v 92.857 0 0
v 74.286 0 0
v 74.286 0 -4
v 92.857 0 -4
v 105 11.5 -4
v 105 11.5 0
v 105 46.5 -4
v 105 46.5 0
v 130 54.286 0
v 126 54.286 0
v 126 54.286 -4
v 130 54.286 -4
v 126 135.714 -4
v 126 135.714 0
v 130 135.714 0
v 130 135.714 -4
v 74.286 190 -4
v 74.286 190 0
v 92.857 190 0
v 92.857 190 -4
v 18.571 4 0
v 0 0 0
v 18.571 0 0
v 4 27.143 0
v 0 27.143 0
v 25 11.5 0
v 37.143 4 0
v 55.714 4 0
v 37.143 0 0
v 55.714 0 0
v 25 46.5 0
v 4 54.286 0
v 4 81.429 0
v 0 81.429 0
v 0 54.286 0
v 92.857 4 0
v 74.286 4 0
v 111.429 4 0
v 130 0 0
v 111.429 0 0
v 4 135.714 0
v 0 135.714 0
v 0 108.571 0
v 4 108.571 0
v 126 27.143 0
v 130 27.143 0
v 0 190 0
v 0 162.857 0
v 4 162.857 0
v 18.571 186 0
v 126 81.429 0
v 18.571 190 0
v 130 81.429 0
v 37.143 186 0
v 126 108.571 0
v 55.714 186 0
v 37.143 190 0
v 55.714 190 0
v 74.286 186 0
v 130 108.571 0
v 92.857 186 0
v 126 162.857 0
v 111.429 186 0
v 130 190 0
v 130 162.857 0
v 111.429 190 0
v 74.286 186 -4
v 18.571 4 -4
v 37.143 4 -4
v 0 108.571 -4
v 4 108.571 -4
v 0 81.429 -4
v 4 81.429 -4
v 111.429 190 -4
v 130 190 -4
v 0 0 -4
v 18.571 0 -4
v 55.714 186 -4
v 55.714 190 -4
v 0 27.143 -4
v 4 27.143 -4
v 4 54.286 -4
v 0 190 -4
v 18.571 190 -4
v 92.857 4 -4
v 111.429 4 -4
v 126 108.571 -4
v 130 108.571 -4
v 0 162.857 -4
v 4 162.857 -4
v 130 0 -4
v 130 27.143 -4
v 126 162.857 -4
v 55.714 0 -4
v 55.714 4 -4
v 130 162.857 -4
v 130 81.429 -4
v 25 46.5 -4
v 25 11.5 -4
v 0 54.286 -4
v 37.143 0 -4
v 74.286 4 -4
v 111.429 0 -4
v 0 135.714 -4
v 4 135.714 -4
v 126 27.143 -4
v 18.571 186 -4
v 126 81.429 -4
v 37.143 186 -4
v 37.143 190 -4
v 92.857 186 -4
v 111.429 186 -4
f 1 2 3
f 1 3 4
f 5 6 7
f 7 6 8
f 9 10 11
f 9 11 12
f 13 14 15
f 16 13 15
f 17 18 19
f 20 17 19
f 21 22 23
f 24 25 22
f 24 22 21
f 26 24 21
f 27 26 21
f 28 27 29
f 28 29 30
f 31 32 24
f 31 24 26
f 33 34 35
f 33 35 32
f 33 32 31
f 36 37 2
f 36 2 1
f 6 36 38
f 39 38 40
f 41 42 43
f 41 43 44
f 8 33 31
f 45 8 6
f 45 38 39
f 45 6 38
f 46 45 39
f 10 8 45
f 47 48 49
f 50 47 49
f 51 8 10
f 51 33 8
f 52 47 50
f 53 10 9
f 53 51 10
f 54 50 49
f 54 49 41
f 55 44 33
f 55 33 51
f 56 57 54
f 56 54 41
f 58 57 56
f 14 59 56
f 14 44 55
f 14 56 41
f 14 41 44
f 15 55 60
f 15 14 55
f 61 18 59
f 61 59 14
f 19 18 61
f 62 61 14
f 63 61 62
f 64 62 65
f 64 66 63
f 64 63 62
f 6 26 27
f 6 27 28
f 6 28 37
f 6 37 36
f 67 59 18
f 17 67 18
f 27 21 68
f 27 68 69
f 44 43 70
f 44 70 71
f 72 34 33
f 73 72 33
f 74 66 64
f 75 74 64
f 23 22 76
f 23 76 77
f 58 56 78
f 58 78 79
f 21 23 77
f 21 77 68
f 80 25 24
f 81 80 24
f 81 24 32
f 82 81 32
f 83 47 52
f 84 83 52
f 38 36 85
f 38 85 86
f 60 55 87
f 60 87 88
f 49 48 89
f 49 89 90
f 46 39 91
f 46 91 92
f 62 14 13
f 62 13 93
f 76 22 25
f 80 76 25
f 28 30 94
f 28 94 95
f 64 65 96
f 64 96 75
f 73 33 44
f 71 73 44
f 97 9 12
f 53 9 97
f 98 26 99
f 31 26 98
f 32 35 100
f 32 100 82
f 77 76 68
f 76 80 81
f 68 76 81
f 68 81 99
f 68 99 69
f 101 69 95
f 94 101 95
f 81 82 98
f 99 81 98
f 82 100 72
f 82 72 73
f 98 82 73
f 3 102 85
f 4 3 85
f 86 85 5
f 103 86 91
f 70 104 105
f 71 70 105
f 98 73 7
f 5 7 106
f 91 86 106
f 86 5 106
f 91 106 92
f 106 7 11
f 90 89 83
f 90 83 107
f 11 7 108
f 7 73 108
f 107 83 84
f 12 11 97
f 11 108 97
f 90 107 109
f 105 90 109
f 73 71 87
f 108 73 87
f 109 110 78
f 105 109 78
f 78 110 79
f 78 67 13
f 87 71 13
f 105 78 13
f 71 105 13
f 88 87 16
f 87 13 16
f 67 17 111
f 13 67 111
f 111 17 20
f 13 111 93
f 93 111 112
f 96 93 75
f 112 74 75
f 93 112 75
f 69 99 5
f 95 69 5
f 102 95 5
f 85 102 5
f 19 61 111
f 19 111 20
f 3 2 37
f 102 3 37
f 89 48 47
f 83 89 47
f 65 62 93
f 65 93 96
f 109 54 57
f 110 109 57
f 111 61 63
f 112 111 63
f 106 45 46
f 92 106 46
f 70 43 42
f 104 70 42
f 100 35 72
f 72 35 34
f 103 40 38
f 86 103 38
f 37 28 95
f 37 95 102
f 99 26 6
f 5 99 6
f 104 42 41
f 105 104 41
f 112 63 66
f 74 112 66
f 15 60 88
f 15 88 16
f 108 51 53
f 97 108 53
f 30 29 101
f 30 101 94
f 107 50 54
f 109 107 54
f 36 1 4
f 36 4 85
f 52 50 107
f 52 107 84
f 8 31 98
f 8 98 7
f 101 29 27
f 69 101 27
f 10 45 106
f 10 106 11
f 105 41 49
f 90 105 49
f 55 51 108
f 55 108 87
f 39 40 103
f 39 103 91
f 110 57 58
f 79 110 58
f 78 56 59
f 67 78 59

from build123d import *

# Parameters (mm, degrees)
BUITENAFMETING_RECHTHOEK_W  = 130
BUITENAFMETING_RECHTHOEK_H  = 190
PLAAT_DEPTH                 = 4
TAND_HOR_W                  = 18.571428572
TAND_HOR_H                  = 4
TAND_BOVEN_DEPTH            = 5
TANDEN_PATROON_BOVEN_COUNT  = 3
TANDEN_PATROON_BOVEN_PITCH  = 37.142857143
TAND_VER_W                  = 4
TAND_VER_H                  = 27.142857143
TAND_LINKS_DEPTH            = 5
TANDEN_PATROON_LINKS_COUNT  = 3
TANDEN_PATROON_LINKS_PITCH  = 54.285714286
TAND_O_W                    = 18.571428572
TAND_O_H                    = 4
TAND_ONDER_DEPTH            = 5
TANDEN_PATROON_ONDER_COUNT  = 3
TANDEN_PATROON_ONDER_PITCH  = 37.142857143
TAND_R_W                    = 4
TAND_R_H                    = 27.142857143
TAND_RECHTS_DEPTH           = 5
TANDEN_PATROON_RECHTS_COUNT = 3
TANDEN_PATROON_RECHTS_PITCH = 54.285714286
SKETCH1_W                   = 80
SKETCH1_H                   = 35
CUT_EXTRUDE1_DEPTH          = 10


with BuildPart() as part:
    # Buitenafmeting Rechthoek → Plaat (new body)
    with BuildSketch(Plane.XY):
        with Locations((65, 95)):
            Rectangle(BUITENAFMETING_RECHTHOEK_W, BUITENAFMETING_RECHTHOEK_H)
    extrude(amount=-PLAAT_DEPTH)

    # Tand Hor → Tand Boven (cut, through all)
    with BuildSketch(Plane.XY):
        with Locations((27.857142857, 188)):
            Rectangle(TAND_HOR_W, TAND_HOR_H)
    tand_boven = extrude(amount=-TAND_BOVEN_DEPTH, mode=Mode.SUBTRACT)

    # Tanden Patroon Boven: Tand Boven ×3
    with Locations(*[(i * TANDEN_PATROON_BOVEN_PITCH, 0, 0) for i in range(1, TANDEN_PATROON_BOVEN_COUNT)]):
        add(tand_boven, mode=Mode.SUBTRACT)

    # Tand Ver → Tand Links (cut, through all)
    with BuildSketch(Plane.XY):
        with Locations((2, 149.285714286)):
            Rectangle(TAND_VER_W, TAND_VER_H)
    tand_links = extrude(amount=-TAND_LINKS_DEPTH, mode=Mode.SUBTRACT)

    # Tanden Patroon Links: Tand Links ×3
    with Locations(*[(0, -i * TANDEN_PATROON_LINKS_PITCH, 0) for i in range(1, TANDEN_PATROON_LINKS_COUNT)]):
        add(tand_links, mode=Mode.SUBTRACT)

    # Tand O → Tand Onder (cut, through all)
    with BuildSketch(Plane.XY):
        with Locations((27.857142857, 2)):
            Rectangle(TAND_O_W, TAND_O_H)
    tand_onder = extrude(amount=-TAND_ONDER_DEPTH, mode=Mode.SUBTRACT)

    # Tanden Patroon Onder: Tand Onder ×3
    with Locations(*[(i * TANDEN_PATROON_ONDER_PITCH, 0, 0) for i in range(1, TANDEN_PATROON_ONDER_COUNT)]):
        add(tand_onder, mode=Mode.SUBTRACT)

    # Tand R → Tand Rechts (cut, through all)
    with BuildSketch(Plane.XY):
        with Locations((128, 149.285714286)):
            Rectangle(TAND_R_W, TAND_R_H)
    tand_rechts = extrude(amount=-TAND_RECHTS_DEPTH, mode=Mode.SUBTRACT)

    # Tanden Patroon Rechts: Tand Rechts ×3
    with Locations(*[(0, -i * TANDEN_PATROON_RECHTS_PITCH, 0) for i in range(1, TANDEN_PATROON_RECHTS_COUNT)]):
        add(tand_rechts, mode=Mode.SUBTRACT)

    # Sketch1 → Cut-Extrude1 (cut)
    with BuildSketch(Plane.XY):
        with Locations((65, 29)):
            Rectangle(SKETCH1_W, SKETCH1_H)
    extrude(amount=-CUT_EXTRUDE1_DEPTH, mode=Mode.SUBTRACT)


solid = part.part
